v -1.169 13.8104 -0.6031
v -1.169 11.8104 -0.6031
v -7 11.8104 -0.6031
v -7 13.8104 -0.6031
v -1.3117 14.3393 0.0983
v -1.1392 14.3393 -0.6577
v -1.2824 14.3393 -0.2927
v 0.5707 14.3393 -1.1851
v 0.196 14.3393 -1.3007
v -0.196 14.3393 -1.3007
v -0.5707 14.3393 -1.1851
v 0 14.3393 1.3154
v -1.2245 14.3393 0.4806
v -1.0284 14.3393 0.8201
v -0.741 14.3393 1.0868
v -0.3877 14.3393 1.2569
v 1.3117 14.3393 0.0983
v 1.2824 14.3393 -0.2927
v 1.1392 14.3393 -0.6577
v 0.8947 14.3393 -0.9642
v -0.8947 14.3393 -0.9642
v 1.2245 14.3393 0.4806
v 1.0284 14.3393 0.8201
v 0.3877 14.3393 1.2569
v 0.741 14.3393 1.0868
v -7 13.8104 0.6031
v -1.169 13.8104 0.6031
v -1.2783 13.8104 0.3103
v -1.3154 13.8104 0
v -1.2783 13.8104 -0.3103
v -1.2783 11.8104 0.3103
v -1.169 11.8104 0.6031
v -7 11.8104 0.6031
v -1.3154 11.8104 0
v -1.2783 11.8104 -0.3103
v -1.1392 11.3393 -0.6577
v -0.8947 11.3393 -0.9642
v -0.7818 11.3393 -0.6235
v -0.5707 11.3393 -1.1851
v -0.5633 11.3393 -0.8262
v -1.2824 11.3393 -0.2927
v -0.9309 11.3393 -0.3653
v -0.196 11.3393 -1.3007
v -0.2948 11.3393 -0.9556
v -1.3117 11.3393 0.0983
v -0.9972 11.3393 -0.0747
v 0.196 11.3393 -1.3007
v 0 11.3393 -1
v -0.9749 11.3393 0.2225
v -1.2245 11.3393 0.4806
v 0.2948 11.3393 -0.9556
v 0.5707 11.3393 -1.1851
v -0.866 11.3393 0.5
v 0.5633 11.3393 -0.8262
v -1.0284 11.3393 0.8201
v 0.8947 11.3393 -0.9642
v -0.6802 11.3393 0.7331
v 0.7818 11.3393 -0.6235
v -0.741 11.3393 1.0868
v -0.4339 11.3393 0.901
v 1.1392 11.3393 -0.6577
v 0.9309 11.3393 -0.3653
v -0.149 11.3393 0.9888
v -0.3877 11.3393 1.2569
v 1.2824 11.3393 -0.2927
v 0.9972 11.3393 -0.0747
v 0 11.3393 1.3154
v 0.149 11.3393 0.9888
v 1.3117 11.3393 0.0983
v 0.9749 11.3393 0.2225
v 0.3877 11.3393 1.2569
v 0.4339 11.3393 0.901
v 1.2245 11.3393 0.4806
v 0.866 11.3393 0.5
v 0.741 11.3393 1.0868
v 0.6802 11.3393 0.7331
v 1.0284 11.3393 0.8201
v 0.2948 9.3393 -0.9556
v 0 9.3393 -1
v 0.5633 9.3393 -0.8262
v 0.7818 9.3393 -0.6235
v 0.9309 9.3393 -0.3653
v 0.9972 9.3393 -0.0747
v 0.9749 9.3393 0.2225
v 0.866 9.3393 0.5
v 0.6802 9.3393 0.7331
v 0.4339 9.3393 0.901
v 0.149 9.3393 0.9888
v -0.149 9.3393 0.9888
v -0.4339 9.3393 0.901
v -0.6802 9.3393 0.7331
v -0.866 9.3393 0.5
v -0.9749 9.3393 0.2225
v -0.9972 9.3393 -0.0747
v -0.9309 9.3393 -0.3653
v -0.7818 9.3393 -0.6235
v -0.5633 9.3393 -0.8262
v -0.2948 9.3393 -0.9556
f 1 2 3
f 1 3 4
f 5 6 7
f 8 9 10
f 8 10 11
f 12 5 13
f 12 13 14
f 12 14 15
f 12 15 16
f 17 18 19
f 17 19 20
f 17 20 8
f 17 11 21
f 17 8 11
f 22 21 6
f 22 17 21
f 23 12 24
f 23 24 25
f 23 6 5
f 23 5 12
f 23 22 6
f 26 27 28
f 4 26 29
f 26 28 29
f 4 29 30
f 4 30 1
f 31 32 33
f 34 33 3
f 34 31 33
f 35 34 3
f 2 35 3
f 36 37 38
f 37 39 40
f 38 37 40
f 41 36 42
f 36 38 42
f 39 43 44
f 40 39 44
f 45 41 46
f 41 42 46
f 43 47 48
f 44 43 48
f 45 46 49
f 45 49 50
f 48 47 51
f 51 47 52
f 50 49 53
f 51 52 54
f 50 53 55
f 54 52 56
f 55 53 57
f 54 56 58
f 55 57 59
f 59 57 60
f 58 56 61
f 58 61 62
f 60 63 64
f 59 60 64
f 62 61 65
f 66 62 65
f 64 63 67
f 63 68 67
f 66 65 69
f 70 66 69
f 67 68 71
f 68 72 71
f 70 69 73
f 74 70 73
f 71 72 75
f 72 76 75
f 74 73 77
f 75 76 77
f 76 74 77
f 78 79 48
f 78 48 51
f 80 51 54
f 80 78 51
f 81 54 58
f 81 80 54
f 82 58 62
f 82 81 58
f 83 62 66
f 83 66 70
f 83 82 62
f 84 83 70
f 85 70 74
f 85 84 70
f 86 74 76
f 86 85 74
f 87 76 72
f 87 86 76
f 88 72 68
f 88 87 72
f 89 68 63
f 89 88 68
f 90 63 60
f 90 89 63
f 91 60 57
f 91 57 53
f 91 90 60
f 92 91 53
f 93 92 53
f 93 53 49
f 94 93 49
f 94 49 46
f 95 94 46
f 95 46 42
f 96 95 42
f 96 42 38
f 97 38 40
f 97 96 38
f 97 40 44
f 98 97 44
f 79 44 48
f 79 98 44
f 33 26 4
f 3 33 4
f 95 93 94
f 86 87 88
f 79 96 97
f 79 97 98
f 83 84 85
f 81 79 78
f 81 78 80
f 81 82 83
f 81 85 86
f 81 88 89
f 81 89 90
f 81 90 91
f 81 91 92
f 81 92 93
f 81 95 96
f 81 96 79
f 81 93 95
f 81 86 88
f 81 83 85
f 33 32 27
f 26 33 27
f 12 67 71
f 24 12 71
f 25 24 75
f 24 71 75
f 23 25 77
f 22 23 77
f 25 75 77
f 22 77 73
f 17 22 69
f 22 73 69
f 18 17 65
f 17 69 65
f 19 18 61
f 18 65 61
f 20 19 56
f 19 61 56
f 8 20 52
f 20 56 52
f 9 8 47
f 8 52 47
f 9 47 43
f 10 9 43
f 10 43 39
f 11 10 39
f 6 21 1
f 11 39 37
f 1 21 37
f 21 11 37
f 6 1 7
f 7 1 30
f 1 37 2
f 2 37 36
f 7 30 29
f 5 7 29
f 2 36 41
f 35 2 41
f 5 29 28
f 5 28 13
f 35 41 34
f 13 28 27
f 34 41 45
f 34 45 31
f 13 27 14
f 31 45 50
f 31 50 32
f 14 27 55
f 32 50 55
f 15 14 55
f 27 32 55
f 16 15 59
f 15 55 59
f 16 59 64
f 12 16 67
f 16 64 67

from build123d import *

# Parameters (mm, degrees)
SKETCH5_R           = 1
BOSS_EXTRUDE2_DEPTH = 2
SKETCH8_R           = 1.315386289
BOSS_EXTRUDE4_DEPTH = 3
SKETCH11_W          = 1.206172966
SKETCH11_H          = 2
BOSS_EXTRUDE5_DEPTH = 7


with BuildPart() as part:
    # Sketch5 → Boss-Extrude2 (new body)
    with BuildSketch(Plane.XZ.offset(-9.339266183)):
        with Locations(Location((0, 0, 0), (0, 0, 270))):
            Circle(SKETCH5_R)
    extrude(amount=-BOSS_EXTRUDE2_DEPTH)

    # Sketch8 → Boss-Extrude4 (add)
    with BuildSketch(Plane(origin=(0, 11.339266183, 0), x_dir=(1, 0, 0), z_dir=(0, 1, 0))):
        with Locations(Location((0, 0, 0), (0, 0, 270))):
            Circle(SKETCH8_R)
    extrude(amount=BOSS_EXTRUDE4_DEPTH)

    # Sketch11 → Boss-Extrude5 (add)
    with BuildSketch(Plane(origin=(0, 0, 0), x_dir=(0, 0, -1), z_dir=(1, 0, 0))):
        with Locations((0, 12.810409413)):
            Rectangle(SKETCH11_W, SKETCH11_H)
    extrude(amount=-BOSS_EXTRUDE5_DEPTH)


solid = part.part
